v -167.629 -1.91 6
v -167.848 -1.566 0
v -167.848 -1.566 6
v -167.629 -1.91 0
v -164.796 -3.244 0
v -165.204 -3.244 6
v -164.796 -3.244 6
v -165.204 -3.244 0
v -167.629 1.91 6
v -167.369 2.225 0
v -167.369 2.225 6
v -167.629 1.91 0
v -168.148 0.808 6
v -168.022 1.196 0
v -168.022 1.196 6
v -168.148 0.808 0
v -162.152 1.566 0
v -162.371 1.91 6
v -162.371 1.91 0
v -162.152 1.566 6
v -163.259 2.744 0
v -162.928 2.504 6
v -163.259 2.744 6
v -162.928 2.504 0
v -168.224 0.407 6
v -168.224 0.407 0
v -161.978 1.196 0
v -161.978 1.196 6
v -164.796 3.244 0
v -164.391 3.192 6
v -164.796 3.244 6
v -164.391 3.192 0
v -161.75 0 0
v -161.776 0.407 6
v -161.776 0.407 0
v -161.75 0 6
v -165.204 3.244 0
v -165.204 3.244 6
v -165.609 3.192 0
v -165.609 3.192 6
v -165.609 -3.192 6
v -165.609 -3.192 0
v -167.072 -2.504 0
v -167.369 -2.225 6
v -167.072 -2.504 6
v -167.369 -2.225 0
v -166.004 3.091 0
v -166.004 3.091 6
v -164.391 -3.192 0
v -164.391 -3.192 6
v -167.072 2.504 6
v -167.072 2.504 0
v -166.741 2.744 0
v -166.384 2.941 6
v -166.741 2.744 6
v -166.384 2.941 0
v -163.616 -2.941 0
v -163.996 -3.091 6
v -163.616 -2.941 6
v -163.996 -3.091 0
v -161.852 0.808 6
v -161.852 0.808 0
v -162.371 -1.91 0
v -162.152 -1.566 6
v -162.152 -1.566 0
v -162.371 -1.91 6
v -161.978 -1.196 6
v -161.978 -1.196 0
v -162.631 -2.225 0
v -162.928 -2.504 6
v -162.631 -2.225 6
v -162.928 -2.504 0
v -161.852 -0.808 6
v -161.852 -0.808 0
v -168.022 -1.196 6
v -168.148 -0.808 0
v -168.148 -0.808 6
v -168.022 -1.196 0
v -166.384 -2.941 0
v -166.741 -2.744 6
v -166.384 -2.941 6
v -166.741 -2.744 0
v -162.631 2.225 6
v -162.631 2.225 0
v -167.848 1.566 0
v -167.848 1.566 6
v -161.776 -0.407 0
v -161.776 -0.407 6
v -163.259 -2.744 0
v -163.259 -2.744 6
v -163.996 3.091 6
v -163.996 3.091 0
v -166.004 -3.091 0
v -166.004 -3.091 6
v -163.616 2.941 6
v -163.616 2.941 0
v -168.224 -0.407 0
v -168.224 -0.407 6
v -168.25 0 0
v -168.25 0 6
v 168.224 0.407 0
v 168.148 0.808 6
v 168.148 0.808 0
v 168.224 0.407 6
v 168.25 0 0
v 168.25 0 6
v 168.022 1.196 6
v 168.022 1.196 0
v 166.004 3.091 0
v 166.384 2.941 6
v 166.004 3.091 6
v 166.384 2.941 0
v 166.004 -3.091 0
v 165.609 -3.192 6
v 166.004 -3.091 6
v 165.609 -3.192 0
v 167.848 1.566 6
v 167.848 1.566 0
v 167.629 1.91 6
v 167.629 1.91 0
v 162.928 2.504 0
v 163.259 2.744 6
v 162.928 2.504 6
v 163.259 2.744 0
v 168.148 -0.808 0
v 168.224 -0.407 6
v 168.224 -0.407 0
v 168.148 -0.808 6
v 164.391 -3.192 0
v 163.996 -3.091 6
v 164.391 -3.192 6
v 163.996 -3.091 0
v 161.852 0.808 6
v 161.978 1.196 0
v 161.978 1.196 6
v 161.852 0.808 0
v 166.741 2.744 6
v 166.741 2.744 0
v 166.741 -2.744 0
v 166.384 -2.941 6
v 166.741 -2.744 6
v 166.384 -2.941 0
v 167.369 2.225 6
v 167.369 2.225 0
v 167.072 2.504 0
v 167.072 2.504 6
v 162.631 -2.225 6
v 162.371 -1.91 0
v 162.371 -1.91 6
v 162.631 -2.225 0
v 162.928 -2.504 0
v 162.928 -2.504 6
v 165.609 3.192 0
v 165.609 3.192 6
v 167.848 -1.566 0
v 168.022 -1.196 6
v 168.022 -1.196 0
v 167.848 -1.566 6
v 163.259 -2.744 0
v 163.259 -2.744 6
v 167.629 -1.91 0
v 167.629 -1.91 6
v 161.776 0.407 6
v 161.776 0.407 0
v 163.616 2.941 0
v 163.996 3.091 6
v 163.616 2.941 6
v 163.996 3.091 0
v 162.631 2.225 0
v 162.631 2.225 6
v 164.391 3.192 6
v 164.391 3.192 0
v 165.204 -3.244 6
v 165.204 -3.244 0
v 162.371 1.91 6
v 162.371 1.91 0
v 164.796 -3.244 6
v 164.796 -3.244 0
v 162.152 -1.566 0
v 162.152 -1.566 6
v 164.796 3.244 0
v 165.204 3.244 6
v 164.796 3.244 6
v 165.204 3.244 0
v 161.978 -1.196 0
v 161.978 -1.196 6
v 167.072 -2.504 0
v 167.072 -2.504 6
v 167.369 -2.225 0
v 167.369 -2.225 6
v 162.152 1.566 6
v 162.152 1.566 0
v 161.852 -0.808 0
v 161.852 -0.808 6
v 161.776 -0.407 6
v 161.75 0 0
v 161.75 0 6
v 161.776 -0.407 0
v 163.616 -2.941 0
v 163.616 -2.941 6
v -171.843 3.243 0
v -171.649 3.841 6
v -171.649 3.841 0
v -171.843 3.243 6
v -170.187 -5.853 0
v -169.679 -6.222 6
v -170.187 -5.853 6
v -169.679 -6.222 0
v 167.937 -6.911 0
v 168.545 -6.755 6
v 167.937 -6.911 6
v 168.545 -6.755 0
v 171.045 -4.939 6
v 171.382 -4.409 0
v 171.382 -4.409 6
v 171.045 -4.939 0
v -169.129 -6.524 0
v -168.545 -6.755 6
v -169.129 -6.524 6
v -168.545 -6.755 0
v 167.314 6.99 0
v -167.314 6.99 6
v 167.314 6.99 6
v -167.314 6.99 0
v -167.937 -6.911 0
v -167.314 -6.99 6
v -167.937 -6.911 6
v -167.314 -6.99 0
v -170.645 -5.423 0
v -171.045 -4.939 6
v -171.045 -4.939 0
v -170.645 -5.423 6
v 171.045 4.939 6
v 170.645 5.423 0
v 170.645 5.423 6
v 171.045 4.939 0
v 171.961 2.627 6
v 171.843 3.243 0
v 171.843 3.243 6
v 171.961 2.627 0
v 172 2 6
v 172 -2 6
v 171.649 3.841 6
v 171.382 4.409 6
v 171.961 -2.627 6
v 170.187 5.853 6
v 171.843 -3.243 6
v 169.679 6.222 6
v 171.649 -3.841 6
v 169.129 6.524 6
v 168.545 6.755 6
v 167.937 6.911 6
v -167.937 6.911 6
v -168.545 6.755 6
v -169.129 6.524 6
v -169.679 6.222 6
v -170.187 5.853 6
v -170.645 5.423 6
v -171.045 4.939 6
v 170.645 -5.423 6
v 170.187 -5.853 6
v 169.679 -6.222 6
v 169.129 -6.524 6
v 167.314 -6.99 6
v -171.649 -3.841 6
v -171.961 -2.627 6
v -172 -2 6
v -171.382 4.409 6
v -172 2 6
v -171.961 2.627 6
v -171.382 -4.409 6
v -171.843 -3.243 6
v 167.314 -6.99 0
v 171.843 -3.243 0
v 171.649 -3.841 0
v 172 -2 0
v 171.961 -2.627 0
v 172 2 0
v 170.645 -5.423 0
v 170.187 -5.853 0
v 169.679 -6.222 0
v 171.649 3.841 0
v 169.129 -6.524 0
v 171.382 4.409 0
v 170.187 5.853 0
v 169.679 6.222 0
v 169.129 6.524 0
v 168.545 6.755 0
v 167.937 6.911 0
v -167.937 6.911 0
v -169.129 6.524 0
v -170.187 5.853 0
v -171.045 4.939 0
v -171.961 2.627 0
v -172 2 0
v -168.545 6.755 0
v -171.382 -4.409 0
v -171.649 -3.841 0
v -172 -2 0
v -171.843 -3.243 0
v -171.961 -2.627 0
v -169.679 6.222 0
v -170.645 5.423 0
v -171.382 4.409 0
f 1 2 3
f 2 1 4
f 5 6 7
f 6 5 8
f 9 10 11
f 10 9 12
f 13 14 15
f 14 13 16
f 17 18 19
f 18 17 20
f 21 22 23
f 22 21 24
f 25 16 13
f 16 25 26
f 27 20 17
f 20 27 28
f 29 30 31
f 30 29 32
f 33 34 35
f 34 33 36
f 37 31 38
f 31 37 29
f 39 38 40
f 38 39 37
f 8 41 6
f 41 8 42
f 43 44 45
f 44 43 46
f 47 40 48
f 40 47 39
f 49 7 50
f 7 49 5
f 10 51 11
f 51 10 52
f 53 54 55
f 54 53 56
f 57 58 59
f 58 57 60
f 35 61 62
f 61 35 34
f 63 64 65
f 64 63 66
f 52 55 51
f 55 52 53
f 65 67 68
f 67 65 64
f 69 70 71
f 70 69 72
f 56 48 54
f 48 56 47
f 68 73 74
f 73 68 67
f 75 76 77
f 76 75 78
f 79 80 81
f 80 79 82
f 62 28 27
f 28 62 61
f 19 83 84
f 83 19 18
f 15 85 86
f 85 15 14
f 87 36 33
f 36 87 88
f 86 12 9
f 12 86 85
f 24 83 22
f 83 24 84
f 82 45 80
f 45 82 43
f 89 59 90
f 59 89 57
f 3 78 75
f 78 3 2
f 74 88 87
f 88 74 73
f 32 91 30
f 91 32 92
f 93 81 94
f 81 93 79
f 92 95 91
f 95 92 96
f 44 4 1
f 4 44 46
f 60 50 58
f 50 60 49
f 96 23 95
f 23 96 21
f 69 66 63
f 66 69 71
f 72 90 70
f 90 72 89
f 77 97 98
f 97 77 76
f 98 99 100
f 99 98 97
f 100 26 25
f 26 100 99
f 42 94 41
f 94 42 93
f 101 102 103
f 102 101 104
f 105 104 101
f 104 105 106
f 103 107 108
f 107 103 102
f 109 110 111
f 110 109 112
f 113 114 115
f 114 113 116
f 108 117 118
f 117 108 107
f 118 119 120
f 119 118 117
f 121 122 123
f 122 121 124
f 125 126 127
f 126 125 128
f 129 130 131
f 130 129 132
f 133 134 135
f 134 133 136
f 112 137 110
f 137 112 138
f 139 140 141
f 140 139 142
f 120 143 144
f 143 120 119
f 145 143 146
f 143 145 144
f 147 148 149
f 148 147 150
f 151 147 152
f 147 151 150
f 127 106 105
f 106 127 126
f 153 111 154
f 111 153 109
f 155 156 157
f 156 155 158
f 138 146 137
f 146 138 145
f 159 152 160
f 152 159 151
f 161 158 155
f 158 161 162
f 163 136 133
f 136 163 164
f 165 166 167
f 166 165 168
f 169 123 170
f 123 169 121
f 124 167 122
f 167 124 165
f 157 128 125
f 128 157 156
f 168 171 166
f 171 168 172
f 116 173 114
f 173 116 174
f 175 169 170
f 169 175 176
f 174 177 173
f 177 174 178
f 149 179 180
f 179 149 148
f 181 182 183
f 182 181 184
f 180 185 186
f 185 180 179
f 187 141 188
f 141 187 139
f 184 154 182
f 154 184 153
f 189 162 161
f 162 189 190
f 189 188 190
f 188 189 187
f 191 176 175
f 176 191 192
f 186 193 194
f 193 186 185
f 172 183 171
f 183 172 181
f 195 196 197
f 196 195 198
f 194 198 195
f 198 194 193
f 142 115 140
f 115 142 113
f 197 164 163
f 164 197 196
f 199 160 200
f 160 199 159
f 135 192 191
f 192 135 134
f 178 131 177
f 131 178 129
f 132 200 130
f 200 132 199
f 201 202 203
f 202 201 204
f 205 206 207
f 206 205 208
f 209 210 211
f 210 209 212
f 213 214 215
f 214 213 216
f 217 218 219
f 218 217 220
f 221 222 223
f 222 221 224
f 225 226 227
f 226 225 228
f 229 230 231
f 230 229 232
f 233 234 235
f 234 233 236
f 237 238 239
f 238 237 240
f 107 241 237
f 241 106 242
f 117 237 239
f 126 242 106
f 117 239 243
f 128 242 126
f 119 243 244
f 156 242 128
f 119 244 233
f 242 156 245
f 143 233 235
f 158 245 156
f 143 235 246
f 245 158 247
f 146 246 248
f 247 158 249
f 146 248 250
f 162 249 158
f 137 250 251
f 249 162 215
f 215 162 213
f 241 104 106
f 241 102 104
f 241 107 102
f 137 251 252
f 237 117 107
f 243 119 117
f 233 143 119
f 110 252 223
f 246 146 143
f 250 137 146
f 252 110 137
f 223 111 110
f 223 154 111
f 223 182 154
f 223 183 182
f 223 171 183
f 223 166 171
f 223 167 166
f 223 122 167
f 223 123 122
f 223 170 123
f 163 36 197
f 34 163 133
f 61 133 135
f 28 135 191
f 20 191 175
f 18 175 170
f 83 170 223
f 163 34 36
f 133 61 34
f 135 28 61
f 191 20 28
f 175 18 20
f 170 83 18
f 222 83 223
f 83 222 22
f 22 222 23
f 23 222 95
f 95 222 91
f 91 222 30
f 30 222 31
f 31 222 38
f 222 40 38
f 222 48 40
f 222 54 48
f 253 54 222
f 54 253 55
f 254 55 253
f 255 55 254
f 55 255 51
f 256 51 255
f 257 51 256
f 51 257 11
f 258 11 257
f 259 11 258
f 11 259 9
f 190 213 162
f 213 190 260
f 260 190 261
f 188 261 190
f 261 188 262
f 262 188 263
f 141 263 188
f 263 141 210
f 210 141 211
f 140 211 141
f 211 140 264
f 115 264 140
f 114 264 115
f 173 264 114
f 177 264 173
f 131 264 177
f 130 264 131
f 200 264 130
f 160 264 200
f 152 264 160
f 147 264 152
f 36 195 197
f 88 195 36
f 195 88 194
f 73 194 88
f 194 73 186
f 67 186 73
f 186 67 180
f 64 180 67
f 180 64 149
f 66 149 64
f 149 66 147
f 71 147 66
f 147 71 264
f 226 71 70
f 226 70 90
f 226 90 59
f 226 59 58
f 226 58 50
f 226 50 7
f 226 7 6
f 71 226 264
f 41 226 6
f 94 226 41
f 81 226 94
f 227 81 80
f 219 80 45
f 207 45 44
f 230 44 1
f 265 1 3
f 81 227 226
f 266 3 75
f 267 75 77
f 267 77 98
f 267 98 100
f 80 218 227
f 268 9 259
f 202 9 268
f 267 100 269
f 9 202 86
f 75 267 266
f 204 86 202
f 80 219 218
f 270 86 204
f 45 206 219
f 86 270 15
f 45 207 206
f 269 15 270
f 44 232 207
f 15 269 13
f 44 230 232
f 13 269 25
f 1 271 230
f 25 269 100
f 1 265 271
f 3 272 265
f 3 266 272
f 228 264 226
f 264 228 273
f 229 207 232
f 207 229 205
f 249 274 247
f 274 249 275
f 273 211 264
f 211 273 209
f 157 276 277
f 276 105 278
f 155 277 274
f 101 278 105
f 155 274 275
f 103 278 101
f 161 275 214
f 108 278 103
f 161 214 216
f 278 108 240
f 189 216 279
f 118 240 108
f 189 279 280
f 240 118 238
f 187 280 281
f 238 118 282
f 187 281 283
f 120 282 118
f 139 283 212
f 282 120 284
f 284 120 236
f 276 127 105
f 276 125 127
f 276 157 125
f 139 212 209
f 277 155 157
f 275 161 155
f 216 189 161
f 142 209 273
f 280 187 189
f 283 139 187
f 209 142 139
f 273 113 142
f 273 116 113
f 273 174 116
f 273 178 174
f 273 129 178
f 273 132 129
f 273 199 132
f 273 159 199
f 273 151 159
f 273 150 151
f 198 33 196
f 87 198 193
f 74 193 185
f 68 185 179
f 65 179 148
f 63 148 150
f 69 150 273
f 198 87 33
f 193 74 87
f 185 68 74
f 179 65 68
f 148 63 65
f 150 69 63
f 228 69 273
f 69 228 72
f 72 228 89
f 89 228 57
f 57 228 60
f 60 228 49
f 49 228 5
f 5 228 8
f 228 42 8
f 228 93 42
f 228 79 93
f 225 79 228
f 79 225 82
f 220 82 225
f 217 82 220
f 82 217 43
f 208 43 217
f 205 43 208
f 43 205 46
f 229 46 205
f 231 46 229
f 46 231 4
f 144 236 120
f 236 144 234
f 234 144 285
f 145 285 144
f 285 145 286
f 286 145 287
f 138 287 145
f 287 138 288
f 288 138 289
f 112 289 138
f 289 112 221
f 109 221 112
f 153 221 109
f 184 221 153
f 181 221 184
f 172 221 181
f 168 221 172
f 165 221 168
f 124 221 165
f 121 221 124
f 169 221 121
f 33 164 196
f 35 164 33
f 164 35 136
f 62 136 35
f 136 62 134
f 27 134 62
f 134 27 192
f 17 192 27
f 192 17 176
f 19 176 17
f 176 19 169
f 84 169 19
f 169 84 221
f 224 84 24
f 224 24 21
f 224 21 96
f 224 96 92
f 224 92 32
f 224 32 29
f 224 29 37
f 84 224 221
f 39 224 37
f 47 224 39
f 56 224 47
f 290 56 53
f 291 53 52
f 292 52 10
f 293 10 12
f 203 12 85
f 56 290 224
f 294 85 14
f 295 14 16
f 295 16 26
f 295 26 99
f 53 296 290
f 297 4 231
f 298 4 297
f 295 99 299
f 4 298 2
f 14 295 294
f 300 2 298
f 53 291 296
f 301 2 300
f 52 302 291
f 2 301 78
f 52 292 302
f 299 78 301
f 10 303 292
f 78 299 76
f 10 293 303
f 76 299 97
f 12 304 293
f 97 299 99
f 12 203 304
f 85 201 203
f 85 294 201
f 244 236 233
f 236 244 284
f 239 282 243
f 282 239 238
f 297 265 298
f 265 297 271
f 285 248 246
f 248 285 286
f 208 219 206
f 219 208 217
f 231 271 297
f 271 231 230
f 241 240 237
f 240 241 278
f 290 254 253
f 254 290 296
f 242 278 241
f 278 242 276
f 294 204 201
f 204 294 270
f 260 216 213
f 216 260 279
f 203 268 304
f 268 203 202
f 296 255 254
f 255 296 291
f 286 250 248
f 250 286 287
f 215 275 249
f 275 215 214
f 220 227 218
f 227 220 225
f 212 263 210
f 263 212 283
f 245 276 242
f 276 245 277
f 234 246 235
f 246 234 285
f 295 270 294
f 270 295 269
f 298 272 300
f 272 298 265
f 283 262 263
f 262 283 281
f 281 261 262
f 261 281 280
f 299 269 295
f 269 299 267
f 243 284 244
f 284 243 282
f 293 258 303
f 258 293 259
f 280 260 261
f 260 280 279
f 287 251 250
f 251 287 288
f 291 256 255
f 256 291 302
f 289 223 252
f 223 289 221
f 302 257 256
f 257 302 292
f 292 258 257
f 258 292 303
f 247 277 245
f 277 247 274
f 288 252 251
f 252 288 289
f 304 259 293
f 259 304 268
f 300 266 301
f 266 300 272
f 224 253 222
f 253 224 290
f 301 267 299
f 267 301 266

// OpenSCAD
$fn = 50;


difference() {
	union() {
		hull() {
			translate(v = [-167.0000000000, 2.0000000000, 0]) {
				cylinder(h = 6, r = 5);
			}
			translate(v = [167.0000000000, 2.0000000000, 0]) {
				cylinder(h = 6, r = 5);
			}
			translate(v = [-167.0000000000, -2.0000000000, 0]) {
				cylinder(h = 6, r = 5);
			}
			translate(v = [167.0000000000, -2.0000000000, 0]) {
				cylinder(h = 6, r = 5);
			}
		}
	}
	union() {
		translate(v = [-165.0000000000, 0.0000000000, -100.0000000000]) {
			cylinder(h = 200, r = 3.2500000000);
		}
		translate(v = [-165.0000000000, 0.0000000000, -100.0000000000]) {
			cylinder(h = 200, r = 3.2500000000);
		}
		translate(v = [165.0000000000, 0.0000000000, -100.0000000000]) {
			cylinder(h = 200, r = 3.2500000000);
		}
		translate(v = [165.0000000000, 0.0000000000, -100.0000000000]) {
			cylinder(h = 200, r = 3.2500000000);
		}
	}
}
